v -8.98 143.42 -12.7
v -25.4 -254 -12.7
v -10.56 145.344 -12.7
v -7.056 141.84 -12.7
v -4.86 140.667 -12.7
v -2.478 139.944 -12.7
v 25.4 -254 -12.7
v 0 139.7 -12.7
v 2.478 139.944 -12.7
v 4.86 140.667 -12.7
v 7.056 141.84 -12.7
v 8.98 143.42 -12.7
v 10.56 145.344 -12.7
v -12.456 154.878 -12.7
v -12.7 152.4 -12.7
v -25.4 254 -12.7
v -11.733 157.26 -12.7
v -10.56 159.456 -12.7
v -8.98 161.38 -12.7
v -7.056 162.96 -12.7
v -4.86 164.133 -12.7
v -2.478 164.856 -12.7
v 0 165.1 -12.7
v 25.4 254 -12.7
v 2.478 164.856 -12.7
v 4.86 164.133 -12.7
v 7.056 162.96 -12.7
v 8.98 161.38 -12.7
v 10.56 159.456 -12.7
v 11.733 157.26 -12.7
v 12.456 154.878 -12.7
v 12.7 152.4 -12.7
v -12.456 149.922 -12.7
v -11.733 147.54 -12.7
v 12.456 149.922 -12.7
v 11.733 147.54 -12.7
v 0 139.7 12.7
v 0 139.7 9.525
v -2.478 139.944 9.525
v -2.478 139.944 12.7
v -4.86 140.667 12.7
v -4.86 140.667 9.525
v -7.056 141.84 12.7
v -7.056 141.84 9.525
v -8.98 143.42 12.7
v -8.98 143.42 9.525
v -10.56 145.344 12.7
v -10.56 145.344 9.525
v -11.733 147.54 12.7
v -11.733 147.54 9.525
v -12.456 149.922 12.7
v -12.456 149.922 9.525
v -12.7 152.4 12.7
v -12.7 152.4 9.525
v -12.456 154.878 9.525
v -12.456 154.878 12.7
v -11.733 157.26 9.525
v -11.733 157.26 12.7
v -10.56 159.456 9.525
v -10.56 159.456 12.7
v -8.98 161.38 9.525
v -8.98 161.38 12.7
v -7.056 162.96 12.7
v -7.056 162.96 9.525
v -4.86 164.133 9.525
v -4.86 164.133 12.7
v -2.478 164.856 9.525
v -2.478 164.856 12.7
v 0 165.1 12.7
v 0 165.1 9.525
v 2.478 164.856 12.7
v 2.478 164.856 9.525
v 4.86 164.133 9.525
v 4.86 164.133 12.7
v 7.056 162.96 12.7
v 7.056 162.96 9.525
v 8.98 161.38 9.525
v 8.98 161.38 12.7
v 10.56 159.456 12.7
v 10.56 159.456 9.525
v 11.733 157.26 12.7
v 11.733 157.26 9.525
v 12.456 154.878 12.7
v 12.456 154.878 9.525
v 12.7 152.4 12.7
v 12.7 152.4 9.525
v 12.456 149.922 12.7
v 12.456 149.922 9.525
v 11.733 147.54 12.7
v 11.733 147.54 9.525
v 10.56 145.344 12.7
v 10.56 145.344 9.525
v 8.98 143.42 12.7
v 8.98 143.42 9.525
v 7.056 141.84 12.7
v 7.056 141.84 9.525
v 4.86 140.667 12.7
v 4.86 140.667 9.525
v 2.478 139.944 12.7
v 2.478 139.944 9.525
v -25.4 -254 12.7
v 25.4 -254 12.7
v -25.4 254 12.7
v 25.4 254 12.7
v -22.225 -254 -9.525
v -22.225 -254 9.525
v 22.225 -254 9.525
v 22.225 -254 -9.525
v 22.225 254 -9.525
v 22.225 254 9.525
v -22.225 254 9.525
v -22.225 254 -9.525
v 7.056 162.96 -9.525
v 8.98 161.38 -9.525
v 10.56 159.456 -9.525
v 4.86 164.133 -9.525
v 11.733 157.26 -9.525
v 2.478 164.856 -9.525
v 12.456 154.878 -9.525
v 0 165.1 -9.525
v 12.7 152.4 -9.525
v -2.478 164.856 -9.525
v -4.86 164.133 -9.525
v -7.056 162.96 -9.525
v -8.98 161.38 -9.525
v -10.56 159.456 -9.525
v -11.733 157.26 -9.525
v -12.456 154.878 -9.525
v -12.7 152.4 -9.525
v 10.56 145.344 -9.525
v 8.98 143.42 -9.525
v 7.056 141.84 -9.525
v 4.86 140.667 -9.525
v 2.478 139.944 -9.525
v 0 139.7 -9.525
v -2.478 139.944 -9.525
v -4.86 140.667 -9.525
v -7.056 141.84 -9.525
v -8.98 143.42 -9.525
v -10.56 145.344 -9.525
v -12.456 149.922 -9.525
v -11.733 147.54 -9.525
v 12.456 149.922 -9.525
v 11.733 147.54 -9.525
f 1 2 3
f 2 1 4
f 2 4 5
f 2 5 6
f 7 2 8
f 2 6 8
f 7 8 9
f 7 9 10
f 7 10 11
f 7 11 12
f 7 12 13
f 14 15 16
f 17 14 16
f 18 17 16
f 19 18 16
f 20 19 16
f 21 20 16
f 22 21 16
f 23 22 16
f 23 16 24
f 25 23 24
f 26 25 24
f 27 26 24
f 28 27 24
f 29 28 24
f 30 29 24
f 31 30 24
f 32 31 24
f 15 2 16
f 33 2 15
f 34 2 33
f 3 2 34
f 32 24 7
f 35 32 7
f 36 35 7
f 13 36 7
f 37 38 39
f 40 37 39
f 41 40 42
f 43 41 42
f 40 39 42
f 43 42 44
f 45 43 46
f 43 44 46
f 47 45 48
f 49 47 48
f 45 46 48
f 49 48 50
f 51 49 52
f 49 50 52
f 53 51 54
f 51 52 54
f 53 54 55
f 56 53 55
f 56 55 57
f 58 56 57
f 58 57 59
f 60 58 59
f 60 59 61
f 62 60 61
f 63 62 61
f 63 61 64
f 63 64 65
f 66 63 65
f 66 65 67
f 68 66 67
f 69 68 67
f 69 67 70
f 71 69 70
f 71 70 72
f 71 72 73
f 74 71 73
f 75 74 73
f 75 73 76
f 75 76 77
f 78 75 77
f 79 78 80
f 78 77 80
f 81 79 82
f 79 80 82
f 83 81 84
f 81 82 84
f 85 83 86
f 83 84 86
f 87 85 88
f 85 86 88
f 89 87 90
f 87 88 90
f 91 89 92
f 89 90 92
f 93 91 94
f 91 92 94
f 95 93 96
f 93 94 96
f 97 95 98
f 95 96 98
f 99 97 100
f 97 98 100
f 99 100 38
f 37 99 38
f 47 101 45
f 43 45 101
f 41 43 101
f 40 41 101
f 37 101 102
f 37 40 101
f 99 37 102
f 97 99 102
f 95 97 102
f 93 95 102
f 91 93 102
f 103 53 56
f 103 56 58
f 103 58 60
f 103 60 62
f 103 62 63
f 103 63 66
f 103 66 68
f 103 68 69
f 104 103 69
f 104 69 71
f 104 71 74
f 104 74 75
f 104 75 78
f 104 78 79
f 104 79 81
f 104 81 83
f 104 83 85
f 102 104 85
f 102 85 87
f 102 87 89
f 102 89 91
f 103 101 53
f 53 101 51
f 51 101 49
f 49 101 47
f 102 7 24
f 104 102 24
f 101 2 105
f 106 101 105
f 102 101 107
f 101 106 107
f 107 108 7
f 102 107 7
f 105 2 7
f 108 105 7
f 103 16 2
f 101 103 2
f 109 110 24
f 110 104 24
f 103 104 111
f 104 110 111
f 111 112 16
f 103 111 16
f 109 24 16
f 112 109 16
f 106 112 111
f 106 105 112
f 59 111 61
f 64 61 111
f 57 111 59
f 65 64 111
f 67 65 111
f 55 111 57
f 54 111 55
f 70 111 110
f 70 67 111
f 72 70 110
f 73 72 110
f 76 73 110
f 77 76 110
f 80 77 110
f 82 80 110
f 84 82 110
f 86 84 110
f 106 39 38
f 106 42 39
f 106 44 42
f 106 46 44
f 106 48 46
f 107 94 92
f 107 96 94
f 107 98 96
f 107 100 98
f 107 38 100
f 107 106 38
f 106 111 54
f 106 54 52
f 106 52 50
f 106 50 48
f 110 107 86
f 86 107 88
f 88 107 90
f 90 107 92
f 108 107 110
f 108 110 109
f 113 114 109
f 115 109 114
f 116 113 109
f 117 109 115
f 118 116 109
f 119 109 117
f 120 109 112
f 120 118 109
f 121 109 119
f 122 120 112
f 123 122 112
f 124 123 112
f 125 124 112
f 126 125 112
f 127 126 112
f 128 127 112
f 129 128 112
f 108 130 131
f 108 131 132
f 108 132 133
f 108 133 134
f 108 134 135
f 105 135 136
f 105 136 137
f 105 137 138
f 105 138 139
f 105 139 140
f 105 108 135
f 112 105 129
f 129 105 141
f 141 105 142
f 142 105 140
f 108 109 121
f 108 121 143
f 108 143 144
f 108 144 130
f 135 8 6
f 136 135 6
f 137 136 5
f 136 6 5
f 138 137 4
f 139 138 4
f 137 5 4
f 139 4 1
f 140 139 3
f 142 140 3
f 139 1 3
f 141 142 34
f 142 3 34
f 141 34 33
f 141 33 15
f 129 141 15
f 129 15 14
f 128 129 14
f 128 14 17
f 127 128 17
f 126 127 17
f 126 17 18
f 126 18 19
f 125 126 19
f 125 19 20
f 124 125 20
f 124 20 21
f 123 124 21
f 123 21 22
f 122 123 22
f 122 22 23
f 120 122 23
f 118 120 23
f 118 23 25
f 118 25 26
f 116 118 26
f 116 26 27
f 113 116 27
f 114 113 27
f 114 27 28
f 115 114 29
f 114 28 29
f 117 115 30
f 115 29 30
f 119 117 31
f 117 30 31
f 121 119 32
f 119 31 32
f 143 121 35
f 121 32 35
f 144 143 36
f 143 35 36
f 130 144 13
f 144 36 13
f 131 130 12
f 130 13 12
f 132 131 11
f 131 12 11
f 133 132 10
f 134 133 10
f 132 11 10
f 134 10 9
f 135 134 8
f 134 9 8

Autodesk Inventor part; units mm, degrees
ref_plane "YZ Plane" through (0, 0, 0) normal (1, 0, 0) x (0, 1, 0)
ref_plane "XZ Plane" through (0, 0, 0) normal (0, 1, 0) x (-1, 0, 0)
ref_plane "XY Plane" through (0, 0, 0) normal (0, 0, 1) x (1, 0, 0)
sketch "Sketch1" plane through (0, 0, 0) normal (0, 0, 1) x (1, 0, 0)
  line L0 (-25.4, -254) -> (25.4, -254)
  line L1 (25.4, -254) -> (25.4, 254)
  line L2 (25.4, 254) -> (-25.4, 254)
  line L3 (-25.4, 254) -> (-25.4, -254)
  line L4 (-25.4, -254) -> (25.4, 254) construction
  line L5 (25.4, -254) -> (-25.4, 254) construction
  point P0 (0, 0)
  dimension "d0" = 50.8
  dimension "d1" = 508
extrude "Extrusion1" add sketch "Sketch1" along normal mid plane 25.4
sketch "Sketch2" plane through (0, 0, 0) normal (0, 1, 0) x (-1, 0, 0)
  line L0 (-22.225, 9.525) -> (-22.225, -9.525)
  line L1 (-22.225, -9.525) -> (22.225, -9.525)
  line L2 (22.225, -9.525) -> (22.225, 9.525)
  line L3 (22.225, 9.525) -> (-22.225, 9.525)
  line L4 (-22.225, 9.525) -> (22.225, -9.525) construction
  line L5 (-22.225, -9.525) -> (22.225, 9.525) construction
  line L6 (25.4, -12.7) -> (25.4, 12.7) projected
  line L7 (25.4, 12.7) -> (-25.4, 12.7) projected
  point P0 (0, 0)
  dimension "d4" = 3.175
  dimension "d5" = 3.175
extrude "Extrusion2" cut sketch "Sketch2" along normal through all both and the other way through all
sketch "Sketch3" plane through (0, 0, 12.7) normal (0, 0, 1) x (1, 0, 0)
  line L0 (-22.225, 254) -> (22.225, 254) construction
  line L1 (0, 254) -> (0, -254) construction
  line L2 (22.225, -254) -> (-22.225, -254) construction
  point P0 (0, 0)
  point P1 (0, 152.4)
  dimension "d8" = 101.6
hole "Hole1" at (0, 152.4, 12.7) direction (0, 0, -1) diameter 25.4 end through all
equation "\"d0\" = width"
equation "\"d1\" = height"
equation "\"d2\" = depth"
equation "\"d4\" = wallThickness"
equation "\"d5\" = wallThickness"
equation "\"d8\" = distanceFromTopForOneInch"
equation "\"depth\" = 25.4"
equation "\"width\" = 50.8"
equation "\"height\" = 508"
equation "\"wallThickness\" = 3.175"
equation "\"distanceFromTopForOneInch\" = 101.6"
properties part number "sideExtrusion" material "Aluminum 6061"
